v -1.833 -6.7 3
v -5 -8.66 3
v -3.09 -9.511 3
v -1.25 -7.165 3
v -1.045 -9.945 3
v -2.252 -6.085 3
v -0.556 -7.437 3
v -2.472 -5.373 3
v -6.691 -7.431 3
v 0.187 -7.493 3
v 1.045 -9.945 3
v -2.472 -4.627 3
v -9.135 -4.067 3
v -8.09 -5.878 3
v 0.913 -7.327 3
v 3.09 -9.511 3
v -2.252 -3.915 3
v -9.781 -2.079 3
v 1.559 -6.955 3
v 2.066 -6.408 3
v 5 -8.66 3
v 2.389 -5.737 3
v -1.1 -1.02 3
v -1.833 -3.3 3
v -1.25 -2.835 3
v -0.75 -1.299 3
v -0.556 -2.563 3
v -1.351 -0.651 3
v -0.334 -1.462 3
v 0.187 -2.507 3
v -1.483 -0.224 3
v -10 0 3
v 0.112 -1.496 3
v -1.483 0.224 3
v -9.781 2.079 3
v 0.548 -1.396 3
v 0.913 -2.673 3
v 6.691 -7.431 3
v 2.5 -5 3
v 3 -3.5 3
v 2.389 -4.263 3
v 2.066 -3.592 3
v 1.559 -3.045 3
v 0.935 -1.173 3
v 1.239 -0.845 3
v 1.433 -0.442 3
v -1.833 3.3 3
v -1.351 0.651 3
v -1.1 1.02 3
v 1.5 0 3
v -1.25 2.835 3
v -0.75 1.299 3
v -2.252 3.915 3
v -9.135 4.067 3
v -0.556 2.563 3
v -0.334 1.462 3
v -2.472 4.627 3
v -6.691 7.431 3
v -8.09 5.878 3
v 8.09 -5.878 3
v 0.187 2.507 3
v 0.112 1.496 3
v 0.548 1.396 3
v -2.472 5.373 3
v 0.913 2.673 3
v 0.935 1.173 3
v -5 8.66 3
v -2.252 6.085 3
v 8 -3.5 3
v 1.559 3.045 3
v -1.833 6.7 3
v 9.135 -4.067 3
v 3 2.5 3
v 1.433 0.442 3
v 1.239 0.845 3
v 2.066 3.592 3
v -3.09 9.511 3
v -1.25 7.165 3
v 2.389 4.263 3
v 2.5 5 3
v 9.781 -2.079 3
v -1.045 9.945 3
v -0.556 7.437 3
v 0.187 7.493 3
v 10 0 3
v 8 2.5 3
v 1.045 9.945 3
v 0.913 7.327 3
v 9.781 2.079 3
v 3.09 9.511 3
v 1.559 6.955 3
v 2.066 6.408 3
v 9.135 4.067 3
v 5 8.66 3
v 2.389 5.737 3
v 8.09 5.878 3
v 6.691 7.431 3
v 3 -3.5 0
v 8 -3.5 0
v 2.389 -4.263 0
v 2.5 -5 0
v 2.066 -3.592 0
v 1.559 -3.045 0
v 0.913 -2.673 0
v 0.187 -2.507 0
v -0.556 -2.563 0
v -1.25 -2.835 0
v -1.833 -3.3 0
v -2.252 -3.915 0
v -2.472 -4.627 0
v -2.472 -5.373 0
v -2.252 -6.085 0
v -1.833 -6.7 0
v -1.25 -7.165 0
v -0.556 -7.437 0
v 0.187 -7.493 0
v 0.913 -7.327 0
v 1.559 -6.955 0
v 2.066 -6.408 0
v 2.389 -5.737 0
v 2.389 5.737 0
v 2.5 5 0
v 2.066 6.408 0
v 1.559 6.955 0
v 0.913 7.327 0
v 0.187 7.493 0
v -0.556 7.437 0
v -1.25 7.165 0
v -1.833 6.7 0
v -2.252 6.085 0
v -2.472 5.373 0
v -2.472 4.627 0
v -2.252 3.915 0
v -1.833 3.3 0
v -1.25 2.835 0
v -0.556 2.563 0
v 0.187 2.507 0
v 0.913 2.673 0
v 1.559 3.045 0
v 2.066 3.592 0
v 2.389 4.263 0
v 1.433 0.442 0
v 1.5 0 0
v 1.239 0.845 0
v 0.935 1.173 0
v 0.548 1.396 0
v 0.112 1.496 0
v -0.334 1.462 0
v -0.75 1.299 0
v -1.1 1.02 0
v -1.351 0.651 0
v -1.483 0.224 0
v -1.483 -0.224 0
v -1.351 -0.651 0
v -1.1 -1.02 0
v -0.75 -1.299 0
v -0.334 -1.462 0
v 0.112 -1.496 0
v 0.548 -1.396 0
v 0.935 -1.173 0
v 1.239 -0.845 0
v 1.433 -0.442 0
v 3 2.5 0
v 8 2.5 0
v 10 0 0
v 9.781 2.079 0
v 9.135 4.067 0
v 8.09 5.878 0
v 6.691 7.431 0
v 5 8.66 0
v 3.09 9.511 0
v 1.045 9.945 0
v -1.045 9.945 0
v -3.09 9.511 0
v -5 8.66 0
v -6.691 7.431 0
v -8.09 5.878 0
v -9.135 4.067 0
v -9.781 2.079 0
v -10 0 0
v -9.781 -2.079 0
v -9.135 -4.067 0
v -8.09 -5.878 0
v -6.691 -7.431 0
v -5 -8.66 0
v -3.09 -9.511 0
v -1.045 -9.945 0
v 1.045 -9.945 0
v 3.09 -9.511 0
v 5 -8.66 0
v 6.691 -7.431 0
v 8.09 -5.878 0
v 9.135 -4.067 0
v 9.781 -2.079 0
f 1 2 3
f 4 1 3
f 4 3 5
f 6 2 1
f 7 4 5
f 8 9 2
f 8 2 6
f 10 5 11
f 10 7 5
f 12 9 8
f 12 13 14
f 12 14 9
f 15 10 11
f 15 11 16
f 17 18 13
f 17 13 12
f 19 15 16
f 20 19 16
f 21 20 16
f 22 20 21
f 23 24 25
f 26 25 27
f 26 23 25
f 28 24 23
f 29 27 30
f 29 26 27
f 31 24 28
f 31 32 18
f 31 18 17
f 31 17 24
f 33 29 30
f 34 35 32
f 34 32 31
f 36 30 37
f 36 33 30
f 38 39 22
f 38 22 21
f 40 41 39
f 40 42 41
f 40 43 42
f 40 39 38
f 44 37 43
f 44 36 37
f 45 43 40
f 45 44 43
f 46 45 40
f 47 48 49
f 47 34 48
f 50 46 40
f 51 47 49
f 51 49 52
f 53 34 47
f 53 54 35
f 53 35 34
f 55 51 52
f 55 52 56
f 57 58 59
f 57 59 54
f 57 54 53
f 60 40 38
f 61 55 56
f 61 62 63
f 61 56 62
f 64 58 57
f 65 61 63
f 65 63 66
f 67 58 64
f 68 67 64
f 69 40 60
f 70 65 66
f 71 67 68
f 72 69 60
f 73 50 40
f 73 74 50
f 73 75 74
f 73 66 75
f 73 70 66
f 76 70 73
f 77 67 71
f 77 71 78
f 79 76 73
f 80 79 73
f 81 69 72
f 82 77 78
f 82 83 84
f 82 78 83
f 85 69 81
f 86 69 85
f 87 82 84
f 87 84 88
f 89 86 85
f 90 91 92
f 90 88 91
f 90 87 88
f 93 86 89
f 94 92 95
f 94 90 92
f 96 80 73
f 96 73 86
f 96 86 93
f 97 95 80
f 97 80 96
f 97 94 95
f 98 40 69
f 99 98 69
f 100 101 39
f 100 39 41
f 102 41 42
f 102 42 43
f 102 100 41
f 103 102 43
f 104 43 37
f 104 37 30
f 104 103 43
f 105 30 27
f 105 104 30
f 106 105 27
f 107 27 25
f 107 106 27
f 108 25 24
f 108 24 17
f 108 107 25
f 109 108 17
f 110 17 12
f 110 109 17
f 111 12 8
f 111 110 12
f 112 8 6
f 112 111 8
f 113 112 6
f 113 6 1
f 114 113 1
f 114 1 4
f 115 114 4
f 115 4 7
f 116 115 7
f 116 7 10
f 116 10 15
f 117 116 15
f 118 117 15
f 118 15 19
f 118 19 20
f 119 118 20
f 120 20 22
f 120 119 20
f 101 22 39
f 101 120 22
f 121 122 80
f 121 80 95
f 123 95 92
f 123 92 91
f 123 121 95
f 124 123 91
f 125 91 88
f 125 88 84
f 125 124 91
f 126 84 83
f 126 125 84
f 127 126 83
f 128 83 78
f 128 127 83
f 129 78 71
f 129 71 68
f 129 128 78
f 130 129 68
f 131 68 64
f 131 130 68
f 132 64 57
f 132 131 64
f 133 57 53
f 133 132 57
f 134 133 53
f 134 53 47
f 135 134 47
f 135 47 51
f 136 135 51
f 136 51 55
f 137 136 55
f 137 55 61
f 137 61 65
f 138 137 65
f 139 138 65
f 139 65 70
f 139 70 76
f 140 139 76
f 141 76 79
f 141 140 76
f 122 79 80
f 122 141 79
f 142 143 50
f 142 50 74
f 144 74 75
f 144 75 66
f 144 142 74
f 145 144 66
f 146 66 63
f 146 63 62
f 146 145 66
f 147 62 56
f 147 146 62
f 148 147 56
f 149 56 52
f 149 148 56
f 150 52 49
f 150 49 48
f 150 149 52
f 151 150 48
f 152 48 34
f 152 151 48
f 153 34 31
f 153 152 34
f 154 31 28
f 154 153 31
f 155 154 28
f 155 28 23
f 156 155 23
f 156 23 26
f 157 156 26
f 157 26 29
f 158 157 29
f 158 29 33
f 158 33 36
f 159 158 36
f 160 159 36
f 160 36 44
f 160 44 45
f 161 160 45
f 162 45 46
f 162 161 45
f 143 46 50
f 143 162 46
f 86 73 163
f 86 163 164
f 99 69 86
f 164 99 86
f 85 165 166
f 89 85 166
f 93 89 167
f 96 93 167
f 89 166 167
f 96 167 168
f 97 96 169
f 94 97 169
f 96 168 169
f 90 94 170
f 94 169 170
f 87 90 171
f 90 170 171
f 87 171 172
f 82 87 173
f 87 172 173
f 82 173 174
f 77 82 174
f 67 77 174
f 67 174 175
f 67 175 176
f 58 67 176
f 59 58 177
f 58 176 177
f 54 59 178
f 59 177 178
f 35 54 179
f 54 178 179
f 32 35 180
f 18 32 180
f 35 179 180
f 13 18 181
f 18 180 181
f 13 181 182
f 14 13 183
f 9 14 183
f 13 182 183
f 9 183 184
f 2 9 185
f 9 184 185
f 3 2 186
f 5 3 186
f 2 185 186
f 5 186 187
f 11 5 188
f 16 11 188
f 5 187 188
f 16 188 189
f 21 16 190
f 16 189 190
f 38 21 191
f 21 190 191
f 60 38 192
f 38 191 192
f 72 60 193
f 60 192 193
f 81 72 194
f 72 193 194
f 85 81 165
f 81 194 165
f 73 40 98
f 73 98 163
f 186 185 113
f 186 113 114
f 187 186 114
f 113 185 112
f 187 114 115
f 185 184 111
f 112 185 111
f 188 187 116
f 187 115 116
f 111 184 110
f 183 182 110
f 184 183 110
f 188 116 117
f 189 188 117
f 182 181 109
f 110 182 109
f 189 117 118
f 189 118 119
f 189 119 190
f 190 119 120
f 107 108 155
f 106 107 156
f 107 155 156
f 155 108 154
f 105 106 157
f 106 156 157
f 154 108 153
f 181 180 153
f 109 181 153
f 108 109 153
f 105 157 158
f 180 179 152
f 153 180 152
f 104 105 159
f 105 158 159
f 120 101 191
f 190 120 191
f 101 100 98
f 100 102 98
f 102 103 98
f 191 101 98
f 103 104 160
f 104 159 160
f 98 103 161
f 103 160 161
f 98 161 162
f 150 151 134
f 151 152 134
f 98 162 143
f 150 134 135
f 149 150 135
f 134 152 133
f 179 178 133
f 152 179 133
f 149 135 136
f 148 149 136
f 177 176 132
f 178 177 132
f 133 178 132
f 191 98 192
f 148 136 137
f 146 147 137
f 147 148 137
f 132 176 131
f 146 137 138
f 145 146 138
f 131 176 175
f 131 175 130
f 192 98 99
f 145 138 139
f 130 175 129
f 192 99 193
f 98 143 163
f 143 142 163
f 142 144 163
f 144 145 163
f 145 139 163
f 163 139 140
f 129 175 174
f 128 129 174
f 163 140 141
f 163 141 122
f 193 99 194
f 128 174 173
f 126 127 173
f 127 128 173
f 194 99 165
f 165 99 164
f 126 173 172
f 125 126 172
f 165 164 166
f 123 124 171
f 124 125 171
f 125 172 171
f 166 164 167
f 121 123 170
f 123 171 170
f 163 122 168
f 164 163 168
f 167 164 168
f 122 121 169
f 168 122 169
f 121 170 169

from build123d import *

# Parameters (mm, degrees)
SKETCH1_R           = 10
SKETCH1_R_2         = 2.5
SKETCH1_R_3         = 1.5
BOSS_EXTRUDE1_DEPTH = 3
SKETCH2_W           = 5
SKETCH2_H           = 6
CUT_EXTRUDE1_DEPTH  = 3


with BuildPart() as part:
    # Sketch1 → Boss-Extrude1 (new body)
    with BuildSketch(Plane.XY):
        Circle(SKETCH1_R)
        with Locations((0, 5)):
            Circle(SKETCH1_R_2, mode=Mode.SUBTRACT)
        Circle(SKETCH1_R_3, mode=Mode.SUBTRACT)
        with Locations((0, -5)):
            Circle(SKETCH1_R_2, mode=Mode.SUBTRACT)
    extrude(amount=BOSS_EXTRUDE1_DEPTH)

    # Sketch2 → Cut-Extrude1 (cut)
    with BuildSketch(Plane.XY.offset(3)):
        with Locations((5.5, -0.5)):
            Rectangle(SKETCH2_W, SKETCH2_H)
    extrude(amount=-CUT_EXTRUDE1_DEPTH, mode=Mode.SUBTRACT)


solid = part.part
